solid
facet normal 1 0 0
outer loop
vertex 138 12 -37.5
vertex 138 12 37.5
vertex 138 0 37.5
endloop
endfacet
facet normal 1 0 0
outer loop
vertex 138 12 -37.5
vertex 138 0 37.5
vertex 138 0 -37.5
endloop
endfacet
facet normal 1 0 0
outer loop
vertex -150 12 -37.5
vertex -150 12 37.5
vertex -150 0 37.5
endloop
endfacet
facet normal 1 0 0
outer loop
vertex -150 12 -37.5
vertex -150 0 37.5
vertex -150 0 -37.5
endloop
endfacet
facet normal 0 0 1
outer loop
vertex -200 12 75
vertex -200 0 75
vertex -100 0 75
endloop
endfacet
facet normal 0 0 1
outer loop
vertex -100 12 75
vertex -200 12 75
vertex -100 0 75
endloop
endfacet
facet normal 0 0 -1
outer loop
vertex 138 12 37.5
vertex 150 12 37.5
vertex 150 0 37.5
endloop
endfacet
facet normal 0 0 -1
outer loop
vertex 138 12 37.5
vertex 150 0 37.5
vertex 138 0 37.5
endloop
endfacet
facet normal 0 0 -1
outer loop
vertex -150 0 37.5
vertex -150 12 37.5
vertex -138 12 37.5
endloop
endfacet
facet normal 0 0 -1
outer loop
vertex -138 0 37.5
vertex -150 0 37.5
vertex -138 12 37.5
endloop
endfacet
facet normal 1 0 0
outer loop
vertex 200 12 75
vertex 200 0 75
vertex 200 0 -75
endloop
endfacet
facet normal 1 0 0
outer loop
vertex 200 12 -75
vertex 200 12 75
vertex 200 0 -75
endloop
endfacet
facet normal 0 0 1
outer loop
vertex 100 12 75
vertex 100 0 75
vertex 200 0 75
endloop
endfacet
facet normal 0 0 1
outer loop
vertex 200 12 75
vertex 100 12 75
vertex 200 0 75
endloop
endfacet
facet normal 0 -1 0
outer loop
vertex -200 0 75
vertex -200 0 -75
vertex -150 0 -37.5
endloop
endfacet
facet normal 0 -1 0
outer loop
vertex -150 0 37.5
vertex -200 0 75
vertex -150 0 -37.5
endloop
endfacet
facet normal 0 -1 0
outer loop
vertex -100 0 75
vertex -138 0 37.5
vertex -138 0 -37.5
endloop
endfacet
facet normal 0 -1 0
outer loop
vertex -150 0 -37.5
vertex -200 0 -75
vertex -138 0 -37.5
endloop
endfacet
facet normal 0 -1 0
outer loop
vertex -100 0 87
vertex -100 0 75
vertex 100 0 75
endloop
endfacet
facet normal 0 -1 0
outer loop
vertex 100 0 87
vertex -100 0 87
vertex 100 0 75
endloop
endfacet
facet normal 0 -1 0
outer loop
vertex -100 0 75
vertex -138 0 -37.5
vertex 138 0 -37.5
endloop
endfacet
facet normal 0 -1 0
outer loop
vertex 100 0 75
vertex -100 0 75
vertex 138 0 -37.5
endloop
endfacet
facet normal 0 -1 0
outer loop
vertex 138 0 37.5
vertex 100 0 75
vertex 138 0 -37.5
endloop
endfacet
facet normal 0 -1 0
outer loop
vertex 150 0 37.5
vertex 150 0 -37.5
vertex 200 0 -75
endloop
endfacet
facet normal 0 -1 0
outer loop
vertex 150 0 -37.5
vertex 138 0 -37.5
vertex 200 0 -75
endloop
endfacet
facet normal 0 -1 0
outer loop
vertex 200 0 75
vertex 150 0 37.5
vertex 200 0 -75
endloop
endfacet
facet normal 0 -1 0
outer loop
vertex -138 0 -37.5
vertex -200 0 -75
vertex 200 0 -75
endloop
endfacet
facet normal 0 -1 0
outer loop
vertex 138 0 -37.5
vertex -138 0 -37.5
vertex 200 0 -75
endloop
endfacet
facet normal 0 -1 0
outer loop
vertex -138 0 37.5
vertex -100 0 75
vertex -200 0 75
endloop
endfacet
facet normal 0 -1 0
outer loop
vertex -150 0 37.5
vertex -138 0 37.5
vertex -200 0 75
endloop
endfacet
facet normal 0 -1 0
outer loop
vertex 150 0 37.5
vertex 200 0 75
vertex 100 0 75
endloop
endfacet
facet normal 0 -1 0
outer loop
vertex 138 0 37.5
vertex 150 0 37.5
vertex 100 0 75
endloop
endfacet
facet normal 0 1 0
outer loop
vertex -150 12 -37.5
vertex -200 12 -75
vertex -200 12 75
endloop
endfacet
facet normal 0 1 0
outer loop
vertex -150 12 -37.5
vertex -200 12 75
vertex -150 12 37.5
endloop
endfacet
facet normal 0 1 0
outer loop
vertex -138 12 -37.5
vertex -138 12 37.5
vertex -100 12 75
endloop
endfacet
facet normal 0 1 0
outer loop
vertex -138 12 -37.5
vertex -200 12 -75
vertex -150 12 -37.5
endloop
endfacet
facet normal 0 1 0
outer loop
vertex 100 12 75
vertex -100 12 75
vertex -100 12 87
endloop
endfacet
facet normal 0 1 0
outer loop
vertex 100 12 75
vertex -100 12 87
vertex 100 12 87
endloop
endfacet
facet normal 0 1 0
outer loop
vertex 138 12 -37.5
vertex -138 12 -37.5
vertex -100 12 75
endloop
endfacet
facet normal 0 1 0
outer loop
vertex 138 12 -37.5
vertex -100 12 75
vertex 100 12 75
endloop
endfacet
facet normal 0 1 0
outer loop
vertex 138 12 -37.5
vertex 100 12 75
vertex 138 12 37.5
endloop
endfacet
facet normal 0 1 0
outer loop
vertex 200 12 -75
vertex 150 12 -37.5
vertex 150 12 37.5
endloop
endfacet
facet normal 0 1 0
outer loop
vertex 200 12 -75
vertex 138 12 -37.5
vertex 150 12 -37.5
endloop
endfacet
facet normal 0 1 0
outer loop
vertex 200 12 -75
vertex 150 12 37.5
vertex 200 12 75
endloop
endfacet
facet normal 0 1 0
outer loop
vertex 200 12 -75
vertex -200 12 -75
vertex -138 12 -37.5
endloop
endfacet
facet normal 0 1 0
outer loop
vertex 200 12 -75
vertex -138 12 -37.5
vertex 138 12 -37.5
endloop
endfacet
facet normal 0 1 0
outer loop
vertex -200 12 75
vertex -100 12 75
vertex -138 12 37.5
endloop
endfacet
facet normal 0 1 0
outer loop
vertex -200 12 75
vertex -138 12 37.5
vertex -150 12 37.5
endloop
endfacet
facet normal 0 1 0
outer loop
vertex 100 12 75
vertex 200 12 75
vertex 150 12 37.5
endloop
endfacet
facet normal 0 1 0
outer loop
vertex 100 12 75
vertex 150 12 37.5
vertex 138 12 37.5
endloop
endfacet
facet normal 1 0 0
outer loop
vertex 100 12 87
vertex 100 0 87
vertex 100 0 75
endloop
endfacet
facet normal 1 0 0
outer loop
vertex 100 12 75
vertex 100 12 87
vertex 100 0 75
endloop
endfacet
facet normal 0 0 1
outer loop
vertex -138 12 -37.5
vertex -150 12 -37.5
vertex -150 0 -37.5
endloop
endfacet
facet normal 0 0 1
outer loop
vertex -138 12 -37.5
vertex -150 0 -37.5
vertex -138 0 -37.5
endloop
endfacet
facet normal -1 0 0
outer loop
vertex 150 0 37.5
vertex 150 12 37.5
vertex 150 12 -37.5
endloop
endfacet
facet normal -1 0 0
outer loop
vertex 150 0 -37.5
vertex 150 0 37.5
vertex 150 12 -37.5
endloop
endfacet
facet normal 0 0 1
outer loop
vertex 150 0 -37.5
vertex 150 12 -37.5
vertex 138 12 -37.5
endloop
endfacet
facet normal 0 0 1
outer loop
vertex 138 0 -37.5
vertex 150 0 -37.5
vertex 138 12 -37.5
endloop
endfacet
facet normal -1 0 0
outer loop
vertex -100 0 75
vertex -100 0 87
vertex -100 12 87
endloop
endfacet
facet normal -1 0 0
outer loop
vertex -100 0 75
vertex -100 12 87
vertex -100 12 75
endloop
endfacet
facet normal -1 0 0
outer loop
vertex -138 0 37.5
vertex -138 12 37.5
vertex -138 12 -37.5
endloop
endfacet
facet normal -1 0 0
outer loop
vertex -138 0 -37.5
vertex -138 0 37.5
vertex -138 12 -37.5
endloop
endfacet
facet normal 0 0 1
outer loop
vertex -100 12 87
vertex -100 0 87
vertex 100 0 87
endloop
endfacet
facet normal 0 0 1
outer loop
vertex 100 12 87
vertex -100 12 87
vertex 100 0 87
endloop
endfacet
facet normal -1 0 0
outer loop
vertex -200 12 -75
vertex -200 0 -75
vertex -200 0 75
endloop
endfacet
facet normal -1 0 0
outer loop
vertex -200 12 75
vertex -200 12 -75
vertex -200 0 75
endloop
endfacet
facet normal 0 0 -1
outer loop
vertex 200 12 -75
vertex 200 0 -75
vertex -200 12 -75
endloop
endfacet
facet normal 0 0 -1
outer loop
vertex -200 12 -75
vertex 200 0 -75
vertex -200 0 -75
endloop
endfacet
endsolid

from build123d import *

# Parameters (mm, degrees)
SKETCH1_W           = 200
SKETCH1_H           = 12
BOSS_EXTRUDE1_DEPTH = 12
SKETCH3_W           = 12
SKETCH3_H           = 75
CUT_EXTRUDE1_DEPTH  = 12


with BuildPart() as part:
    # Sketch1 → Boss-Extrude1 (new body)
    with BuildSketch(Plane(origin=(0, 0, 0), x_dir=(1, 0, 0), z_dir=(0, 1, 0))):
        Polygon((200, 75), (-200, 75), (-200, -75), (-100, -75), (-100, -63), (100, -63), (100, -75), (200, -75), align=None)
        with Locations((0, -81)):
            Rectangle(SKETCH1_W, SKETCH1_H)
        with Locations((0, -69)):
            Rectangle(SKETCH1_W, SKETCH1_H)
    extrude(amount=BOSS_EXTRUDE1_DEPTH)

    # Sketch3 → Cut-Extrude1 (cut)
    with BuildSketch(Plane(origin=(0, 12, 0), x_dir=(1, 0, 0), z_dir=(0, 1, 0))):
        with Locations((-144, 0)):
            Rectangle(SKETCH3_W, SKETCH3_H)
    cut_extrude1 = extrude(amount=-CUT_EXTRUDE1_DEPTH, mode=Mode.SUBTRACT)

    # Mirror1: Cut-Extrude1 across plane
    add(cut_extrude1.mirror(Plane(origin=(0, 0, 0), x_dir=(0, 0, 1), z_dir=(1, 0, 0))), mode=Mode.SUBTRACT)


solid = part.part
